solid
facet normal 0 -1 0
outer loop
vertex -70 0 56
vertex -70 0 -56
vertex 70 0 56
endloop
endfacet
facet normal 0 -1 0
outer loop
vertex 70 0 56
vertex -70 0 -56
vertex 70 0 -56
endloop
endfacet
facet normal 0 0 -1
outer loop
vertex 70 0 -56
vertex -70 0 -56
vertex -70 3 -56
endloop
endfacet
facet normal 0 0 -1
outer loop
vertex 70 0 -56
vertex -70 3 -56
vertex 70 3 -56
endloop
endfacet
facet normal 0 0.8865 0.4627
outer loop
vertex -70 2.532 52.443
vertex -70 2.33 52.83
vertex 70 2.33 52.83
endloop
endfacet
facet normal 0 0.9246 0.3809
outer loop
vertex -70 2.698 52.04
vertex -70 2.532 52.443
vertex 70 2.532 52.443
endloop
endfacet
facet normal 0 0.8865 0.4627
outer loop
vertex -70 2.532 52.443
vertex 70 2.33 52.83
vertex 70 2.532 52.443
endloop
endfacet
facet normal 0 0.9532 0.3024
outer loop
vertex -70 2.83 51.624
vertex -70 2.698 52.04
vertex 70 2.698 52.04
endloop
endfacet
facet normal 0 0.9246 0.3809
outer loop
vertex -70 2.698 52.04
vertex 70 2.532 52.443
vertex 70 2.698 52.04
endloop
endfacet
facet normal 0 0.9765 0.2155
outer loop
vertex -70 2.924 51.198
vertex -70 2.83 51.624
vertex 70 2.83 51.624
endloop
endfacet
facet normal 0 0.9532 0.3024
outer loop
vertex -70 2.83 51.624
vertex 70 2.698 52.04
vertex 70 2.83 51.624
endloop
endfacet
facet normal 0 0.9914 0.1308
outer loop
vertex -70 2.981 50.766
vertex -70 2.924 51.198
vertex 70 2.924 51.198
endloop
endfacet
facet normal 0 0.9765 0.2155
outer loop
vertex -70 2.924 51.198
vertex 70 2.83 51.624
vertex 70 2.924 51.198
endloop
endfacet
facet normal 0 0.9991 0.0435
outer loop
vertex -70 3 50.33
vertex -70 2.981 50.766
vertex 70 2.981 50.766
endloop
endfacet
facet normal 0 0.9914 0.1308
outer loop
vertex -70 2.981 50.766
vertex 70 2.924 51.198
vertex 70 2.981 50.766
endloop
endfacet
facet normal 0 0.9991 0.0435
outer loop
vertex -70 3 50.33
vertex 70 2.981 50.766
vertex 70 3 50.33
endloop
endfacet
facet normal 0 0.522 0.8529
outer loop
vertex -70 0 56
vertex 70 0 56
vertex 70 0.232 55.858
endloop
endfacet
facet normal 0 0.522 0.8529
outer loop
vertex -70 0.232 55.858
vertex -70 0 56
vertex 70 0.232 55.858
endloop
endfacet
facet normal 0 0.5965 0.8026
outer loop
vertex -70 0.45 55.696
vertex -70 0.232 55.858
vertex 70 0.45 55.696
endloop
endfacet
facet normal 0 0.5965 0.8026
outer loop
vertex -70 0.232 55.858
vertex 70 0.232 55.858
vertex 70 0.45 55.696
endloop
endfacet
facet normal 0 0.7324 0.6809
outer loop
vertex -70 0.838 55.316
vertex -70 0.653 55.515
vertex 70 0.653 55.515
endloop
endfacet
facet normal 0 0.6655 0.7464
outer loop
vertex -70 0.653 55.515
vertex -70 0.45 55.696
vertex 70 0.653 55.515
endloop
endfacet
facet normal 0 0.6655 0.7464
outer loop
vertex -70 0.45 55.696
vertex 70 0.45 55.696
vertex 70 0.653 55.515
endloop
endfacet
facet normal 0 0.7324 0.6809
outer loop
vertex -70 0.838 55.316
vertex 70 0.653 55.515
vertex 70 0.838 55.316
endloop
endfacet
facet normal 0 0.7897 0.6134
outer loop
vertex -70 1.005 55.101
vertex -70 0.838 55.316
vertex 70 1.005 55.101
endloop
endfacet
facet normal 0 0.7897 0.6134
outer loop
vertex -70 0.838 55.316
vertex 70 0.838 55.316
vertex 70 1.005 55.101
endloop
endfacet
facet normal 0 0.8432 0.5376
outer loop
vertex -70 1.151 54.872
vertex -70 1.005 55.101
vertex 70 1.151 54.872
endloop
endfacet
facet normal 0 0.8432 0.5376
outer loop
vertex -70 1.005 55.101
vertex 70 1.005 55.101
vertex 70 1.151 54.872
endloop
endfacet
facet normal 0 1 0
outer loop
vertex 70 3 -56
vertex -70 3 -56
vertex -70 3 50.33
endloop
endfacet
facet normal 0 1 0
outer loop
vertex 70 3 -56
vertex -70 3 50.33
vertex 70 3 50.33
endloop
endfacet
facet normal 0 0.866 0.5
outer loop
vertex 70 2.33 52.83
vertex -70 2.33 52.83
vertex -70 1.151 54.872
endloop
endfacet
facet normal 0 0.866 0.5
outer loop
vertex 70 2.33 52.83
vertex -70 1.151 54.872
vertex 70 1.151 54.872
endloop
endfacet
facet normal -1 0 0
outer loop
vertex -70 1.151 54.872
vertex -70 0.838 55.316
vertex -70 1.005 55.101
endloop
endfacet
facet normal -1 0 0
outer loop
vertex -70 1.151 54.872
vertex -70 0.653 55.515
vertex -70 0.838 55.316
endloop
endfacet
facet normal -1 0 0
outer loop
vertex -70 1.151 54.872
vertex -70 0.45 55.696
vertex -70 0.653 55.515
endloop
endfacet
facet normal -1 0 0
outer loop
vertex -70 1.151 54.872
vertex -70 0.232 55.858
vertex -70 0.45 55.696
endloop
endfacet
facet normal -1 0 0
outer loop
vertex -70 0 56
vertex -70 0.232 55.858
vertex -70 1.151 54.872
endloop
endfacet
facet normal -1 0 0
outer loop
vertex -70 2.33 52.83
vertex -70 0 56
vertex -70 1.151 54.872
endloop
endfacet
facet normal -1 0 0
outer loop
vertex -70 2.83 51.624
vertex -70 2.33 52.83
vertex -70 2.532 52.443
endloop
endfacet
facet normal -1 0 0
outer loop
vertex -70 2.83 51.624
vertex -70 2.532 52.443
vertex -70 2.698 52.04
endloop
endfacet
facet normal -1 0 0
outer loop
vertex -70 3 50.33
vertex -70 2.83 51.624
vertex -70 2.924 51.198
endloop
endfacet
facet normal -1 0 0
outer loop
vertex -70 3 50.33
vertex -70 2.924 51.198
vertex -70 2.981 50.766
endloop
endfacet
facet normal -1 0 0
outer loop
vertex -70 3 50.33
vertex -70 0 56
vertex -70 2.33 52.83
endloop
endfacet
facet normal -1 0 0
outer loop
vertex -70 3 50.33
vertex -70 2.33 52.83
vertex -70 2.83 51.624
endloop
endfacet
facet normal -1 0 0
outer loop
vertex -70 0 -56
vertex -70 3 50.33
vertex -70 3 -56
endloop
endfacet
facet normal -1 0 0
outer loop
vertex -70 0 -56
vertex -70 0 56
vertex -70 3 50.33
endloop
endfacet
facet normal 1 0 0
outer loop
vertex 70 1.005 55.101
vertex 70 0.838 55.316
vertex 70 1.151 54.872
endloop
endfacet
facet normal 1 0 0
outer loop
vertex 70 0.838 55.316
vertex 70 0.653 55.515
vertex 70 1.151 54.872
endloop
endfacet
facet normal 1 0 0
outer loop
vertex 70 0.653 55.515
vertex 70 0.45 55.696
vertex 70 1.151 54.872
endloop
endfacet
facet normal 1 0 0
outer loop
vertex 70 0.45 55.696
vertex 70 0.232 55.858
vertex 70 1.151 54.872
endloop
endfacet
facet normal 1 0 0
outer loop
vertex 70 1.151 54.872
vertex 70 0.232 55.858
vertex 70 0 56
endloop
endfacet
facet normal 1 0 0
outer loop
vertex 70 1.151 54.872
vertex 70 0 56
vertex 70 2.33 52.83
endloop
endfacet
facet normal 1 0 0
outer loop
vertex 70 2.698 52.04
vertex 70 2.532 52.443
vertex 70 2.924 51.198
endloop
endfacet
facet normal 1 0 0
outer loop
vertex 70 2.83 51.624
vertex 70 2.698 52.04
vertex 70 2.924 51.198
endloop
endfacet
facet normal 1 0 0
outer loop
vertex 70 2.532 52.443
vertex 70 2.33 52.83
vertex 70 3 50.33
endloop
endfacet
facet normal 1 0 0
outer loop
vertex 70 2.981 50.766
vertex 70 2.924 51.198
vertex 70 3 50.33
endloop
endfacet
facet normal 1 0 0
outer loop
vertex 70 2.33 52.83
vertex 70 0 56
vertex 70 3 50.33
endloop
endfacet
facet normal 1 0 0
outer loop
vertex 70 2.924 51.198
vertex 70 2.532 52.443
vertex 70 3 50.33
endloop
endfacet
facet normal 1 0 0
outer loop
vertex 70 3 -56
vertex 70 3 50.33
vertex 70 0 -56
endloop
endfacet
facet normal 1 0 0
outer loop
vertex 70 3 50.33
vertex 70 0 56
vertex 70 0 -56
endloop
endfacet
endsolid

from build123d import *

# Parameters (mm, degrees)
SKETCH_1_W      = 140
SKETCH_1_H      = 112
EXTRUDE_1_DEPTH = 3
CHAMFER_1_SIZE  = 2.5
CHAMFER_1_SIZE2 = 4.330127019
FILLET_1_R      = 5
FILLET_2_R      = 3


with BuildPart() as part:
    # Эскиз1 → Бобышка-Вытянуть1 (new body)
    with BuildSketch(Plane(origin=(0, 0, 0), x_dir=(1, 0, 0), z_dir=(0, 1, 0))):
        Rectangle(SKETCH_1_W, SKETCH_1_H)
    extrude(amount=EXTRUDE_1_DEPTH)

    # Фаска1
    chamfer_1_edges = [part.edges().sort_by_distance(p)[0] for p in [
        (0, 3, 56),
    ]]
    chamfer_1_side = [part.faces().sort_by_distance(p)[0] for p in [
        (0, 1.5, 56),
    ]]
    chamfer(chamfer_1_edges, length=CHAMFER_1_SIZE, length2=CHAMFER_1_SIZE2, reference=chamfer_1_side[0])

    # Скругление1
    fillet_1_edges = [part.edges().sort_by_distance(p)[0] for p in [
        (0, 3, 51.669872981),
    ]]
    fillet(fillet_1_edges, radius=FILLET_1_R)

    # Скругление2
    # the kernel refuses this fillet: 3 mm, written as the material it takes off along each edge
    with BuildSketch(Plane(origin=(73.256507609, 0.5, 56), x_dir=(0, 0.49999999999999795, -0.8660254037844398), z_dir=(-1, 0, 0))) as fillet_2_piece_1:
        with BuildLine():
            CenterArc((1.302603044, 3), FILLET_2_R, 238.832994719, 31.167005281)
            Line((-0.25, 0.433012702), (-0.281052061, 0.381672956))
            ThreePointArc((-0.281052061, 0.381672956), (-0.176961524, 0.186506351), (-0.051961524, -0.03))
            Line((-0.051961524, -0.03), (0, -0.06))
            Line((0, -0.06), (1.302603044, -0.06))
            Line((1.302603044, -0.06), (1.302603044, 0))
        make_face()
    extrude(amount=146.513015219, mode=Mode.SUBTRACT)


solid = part.part
